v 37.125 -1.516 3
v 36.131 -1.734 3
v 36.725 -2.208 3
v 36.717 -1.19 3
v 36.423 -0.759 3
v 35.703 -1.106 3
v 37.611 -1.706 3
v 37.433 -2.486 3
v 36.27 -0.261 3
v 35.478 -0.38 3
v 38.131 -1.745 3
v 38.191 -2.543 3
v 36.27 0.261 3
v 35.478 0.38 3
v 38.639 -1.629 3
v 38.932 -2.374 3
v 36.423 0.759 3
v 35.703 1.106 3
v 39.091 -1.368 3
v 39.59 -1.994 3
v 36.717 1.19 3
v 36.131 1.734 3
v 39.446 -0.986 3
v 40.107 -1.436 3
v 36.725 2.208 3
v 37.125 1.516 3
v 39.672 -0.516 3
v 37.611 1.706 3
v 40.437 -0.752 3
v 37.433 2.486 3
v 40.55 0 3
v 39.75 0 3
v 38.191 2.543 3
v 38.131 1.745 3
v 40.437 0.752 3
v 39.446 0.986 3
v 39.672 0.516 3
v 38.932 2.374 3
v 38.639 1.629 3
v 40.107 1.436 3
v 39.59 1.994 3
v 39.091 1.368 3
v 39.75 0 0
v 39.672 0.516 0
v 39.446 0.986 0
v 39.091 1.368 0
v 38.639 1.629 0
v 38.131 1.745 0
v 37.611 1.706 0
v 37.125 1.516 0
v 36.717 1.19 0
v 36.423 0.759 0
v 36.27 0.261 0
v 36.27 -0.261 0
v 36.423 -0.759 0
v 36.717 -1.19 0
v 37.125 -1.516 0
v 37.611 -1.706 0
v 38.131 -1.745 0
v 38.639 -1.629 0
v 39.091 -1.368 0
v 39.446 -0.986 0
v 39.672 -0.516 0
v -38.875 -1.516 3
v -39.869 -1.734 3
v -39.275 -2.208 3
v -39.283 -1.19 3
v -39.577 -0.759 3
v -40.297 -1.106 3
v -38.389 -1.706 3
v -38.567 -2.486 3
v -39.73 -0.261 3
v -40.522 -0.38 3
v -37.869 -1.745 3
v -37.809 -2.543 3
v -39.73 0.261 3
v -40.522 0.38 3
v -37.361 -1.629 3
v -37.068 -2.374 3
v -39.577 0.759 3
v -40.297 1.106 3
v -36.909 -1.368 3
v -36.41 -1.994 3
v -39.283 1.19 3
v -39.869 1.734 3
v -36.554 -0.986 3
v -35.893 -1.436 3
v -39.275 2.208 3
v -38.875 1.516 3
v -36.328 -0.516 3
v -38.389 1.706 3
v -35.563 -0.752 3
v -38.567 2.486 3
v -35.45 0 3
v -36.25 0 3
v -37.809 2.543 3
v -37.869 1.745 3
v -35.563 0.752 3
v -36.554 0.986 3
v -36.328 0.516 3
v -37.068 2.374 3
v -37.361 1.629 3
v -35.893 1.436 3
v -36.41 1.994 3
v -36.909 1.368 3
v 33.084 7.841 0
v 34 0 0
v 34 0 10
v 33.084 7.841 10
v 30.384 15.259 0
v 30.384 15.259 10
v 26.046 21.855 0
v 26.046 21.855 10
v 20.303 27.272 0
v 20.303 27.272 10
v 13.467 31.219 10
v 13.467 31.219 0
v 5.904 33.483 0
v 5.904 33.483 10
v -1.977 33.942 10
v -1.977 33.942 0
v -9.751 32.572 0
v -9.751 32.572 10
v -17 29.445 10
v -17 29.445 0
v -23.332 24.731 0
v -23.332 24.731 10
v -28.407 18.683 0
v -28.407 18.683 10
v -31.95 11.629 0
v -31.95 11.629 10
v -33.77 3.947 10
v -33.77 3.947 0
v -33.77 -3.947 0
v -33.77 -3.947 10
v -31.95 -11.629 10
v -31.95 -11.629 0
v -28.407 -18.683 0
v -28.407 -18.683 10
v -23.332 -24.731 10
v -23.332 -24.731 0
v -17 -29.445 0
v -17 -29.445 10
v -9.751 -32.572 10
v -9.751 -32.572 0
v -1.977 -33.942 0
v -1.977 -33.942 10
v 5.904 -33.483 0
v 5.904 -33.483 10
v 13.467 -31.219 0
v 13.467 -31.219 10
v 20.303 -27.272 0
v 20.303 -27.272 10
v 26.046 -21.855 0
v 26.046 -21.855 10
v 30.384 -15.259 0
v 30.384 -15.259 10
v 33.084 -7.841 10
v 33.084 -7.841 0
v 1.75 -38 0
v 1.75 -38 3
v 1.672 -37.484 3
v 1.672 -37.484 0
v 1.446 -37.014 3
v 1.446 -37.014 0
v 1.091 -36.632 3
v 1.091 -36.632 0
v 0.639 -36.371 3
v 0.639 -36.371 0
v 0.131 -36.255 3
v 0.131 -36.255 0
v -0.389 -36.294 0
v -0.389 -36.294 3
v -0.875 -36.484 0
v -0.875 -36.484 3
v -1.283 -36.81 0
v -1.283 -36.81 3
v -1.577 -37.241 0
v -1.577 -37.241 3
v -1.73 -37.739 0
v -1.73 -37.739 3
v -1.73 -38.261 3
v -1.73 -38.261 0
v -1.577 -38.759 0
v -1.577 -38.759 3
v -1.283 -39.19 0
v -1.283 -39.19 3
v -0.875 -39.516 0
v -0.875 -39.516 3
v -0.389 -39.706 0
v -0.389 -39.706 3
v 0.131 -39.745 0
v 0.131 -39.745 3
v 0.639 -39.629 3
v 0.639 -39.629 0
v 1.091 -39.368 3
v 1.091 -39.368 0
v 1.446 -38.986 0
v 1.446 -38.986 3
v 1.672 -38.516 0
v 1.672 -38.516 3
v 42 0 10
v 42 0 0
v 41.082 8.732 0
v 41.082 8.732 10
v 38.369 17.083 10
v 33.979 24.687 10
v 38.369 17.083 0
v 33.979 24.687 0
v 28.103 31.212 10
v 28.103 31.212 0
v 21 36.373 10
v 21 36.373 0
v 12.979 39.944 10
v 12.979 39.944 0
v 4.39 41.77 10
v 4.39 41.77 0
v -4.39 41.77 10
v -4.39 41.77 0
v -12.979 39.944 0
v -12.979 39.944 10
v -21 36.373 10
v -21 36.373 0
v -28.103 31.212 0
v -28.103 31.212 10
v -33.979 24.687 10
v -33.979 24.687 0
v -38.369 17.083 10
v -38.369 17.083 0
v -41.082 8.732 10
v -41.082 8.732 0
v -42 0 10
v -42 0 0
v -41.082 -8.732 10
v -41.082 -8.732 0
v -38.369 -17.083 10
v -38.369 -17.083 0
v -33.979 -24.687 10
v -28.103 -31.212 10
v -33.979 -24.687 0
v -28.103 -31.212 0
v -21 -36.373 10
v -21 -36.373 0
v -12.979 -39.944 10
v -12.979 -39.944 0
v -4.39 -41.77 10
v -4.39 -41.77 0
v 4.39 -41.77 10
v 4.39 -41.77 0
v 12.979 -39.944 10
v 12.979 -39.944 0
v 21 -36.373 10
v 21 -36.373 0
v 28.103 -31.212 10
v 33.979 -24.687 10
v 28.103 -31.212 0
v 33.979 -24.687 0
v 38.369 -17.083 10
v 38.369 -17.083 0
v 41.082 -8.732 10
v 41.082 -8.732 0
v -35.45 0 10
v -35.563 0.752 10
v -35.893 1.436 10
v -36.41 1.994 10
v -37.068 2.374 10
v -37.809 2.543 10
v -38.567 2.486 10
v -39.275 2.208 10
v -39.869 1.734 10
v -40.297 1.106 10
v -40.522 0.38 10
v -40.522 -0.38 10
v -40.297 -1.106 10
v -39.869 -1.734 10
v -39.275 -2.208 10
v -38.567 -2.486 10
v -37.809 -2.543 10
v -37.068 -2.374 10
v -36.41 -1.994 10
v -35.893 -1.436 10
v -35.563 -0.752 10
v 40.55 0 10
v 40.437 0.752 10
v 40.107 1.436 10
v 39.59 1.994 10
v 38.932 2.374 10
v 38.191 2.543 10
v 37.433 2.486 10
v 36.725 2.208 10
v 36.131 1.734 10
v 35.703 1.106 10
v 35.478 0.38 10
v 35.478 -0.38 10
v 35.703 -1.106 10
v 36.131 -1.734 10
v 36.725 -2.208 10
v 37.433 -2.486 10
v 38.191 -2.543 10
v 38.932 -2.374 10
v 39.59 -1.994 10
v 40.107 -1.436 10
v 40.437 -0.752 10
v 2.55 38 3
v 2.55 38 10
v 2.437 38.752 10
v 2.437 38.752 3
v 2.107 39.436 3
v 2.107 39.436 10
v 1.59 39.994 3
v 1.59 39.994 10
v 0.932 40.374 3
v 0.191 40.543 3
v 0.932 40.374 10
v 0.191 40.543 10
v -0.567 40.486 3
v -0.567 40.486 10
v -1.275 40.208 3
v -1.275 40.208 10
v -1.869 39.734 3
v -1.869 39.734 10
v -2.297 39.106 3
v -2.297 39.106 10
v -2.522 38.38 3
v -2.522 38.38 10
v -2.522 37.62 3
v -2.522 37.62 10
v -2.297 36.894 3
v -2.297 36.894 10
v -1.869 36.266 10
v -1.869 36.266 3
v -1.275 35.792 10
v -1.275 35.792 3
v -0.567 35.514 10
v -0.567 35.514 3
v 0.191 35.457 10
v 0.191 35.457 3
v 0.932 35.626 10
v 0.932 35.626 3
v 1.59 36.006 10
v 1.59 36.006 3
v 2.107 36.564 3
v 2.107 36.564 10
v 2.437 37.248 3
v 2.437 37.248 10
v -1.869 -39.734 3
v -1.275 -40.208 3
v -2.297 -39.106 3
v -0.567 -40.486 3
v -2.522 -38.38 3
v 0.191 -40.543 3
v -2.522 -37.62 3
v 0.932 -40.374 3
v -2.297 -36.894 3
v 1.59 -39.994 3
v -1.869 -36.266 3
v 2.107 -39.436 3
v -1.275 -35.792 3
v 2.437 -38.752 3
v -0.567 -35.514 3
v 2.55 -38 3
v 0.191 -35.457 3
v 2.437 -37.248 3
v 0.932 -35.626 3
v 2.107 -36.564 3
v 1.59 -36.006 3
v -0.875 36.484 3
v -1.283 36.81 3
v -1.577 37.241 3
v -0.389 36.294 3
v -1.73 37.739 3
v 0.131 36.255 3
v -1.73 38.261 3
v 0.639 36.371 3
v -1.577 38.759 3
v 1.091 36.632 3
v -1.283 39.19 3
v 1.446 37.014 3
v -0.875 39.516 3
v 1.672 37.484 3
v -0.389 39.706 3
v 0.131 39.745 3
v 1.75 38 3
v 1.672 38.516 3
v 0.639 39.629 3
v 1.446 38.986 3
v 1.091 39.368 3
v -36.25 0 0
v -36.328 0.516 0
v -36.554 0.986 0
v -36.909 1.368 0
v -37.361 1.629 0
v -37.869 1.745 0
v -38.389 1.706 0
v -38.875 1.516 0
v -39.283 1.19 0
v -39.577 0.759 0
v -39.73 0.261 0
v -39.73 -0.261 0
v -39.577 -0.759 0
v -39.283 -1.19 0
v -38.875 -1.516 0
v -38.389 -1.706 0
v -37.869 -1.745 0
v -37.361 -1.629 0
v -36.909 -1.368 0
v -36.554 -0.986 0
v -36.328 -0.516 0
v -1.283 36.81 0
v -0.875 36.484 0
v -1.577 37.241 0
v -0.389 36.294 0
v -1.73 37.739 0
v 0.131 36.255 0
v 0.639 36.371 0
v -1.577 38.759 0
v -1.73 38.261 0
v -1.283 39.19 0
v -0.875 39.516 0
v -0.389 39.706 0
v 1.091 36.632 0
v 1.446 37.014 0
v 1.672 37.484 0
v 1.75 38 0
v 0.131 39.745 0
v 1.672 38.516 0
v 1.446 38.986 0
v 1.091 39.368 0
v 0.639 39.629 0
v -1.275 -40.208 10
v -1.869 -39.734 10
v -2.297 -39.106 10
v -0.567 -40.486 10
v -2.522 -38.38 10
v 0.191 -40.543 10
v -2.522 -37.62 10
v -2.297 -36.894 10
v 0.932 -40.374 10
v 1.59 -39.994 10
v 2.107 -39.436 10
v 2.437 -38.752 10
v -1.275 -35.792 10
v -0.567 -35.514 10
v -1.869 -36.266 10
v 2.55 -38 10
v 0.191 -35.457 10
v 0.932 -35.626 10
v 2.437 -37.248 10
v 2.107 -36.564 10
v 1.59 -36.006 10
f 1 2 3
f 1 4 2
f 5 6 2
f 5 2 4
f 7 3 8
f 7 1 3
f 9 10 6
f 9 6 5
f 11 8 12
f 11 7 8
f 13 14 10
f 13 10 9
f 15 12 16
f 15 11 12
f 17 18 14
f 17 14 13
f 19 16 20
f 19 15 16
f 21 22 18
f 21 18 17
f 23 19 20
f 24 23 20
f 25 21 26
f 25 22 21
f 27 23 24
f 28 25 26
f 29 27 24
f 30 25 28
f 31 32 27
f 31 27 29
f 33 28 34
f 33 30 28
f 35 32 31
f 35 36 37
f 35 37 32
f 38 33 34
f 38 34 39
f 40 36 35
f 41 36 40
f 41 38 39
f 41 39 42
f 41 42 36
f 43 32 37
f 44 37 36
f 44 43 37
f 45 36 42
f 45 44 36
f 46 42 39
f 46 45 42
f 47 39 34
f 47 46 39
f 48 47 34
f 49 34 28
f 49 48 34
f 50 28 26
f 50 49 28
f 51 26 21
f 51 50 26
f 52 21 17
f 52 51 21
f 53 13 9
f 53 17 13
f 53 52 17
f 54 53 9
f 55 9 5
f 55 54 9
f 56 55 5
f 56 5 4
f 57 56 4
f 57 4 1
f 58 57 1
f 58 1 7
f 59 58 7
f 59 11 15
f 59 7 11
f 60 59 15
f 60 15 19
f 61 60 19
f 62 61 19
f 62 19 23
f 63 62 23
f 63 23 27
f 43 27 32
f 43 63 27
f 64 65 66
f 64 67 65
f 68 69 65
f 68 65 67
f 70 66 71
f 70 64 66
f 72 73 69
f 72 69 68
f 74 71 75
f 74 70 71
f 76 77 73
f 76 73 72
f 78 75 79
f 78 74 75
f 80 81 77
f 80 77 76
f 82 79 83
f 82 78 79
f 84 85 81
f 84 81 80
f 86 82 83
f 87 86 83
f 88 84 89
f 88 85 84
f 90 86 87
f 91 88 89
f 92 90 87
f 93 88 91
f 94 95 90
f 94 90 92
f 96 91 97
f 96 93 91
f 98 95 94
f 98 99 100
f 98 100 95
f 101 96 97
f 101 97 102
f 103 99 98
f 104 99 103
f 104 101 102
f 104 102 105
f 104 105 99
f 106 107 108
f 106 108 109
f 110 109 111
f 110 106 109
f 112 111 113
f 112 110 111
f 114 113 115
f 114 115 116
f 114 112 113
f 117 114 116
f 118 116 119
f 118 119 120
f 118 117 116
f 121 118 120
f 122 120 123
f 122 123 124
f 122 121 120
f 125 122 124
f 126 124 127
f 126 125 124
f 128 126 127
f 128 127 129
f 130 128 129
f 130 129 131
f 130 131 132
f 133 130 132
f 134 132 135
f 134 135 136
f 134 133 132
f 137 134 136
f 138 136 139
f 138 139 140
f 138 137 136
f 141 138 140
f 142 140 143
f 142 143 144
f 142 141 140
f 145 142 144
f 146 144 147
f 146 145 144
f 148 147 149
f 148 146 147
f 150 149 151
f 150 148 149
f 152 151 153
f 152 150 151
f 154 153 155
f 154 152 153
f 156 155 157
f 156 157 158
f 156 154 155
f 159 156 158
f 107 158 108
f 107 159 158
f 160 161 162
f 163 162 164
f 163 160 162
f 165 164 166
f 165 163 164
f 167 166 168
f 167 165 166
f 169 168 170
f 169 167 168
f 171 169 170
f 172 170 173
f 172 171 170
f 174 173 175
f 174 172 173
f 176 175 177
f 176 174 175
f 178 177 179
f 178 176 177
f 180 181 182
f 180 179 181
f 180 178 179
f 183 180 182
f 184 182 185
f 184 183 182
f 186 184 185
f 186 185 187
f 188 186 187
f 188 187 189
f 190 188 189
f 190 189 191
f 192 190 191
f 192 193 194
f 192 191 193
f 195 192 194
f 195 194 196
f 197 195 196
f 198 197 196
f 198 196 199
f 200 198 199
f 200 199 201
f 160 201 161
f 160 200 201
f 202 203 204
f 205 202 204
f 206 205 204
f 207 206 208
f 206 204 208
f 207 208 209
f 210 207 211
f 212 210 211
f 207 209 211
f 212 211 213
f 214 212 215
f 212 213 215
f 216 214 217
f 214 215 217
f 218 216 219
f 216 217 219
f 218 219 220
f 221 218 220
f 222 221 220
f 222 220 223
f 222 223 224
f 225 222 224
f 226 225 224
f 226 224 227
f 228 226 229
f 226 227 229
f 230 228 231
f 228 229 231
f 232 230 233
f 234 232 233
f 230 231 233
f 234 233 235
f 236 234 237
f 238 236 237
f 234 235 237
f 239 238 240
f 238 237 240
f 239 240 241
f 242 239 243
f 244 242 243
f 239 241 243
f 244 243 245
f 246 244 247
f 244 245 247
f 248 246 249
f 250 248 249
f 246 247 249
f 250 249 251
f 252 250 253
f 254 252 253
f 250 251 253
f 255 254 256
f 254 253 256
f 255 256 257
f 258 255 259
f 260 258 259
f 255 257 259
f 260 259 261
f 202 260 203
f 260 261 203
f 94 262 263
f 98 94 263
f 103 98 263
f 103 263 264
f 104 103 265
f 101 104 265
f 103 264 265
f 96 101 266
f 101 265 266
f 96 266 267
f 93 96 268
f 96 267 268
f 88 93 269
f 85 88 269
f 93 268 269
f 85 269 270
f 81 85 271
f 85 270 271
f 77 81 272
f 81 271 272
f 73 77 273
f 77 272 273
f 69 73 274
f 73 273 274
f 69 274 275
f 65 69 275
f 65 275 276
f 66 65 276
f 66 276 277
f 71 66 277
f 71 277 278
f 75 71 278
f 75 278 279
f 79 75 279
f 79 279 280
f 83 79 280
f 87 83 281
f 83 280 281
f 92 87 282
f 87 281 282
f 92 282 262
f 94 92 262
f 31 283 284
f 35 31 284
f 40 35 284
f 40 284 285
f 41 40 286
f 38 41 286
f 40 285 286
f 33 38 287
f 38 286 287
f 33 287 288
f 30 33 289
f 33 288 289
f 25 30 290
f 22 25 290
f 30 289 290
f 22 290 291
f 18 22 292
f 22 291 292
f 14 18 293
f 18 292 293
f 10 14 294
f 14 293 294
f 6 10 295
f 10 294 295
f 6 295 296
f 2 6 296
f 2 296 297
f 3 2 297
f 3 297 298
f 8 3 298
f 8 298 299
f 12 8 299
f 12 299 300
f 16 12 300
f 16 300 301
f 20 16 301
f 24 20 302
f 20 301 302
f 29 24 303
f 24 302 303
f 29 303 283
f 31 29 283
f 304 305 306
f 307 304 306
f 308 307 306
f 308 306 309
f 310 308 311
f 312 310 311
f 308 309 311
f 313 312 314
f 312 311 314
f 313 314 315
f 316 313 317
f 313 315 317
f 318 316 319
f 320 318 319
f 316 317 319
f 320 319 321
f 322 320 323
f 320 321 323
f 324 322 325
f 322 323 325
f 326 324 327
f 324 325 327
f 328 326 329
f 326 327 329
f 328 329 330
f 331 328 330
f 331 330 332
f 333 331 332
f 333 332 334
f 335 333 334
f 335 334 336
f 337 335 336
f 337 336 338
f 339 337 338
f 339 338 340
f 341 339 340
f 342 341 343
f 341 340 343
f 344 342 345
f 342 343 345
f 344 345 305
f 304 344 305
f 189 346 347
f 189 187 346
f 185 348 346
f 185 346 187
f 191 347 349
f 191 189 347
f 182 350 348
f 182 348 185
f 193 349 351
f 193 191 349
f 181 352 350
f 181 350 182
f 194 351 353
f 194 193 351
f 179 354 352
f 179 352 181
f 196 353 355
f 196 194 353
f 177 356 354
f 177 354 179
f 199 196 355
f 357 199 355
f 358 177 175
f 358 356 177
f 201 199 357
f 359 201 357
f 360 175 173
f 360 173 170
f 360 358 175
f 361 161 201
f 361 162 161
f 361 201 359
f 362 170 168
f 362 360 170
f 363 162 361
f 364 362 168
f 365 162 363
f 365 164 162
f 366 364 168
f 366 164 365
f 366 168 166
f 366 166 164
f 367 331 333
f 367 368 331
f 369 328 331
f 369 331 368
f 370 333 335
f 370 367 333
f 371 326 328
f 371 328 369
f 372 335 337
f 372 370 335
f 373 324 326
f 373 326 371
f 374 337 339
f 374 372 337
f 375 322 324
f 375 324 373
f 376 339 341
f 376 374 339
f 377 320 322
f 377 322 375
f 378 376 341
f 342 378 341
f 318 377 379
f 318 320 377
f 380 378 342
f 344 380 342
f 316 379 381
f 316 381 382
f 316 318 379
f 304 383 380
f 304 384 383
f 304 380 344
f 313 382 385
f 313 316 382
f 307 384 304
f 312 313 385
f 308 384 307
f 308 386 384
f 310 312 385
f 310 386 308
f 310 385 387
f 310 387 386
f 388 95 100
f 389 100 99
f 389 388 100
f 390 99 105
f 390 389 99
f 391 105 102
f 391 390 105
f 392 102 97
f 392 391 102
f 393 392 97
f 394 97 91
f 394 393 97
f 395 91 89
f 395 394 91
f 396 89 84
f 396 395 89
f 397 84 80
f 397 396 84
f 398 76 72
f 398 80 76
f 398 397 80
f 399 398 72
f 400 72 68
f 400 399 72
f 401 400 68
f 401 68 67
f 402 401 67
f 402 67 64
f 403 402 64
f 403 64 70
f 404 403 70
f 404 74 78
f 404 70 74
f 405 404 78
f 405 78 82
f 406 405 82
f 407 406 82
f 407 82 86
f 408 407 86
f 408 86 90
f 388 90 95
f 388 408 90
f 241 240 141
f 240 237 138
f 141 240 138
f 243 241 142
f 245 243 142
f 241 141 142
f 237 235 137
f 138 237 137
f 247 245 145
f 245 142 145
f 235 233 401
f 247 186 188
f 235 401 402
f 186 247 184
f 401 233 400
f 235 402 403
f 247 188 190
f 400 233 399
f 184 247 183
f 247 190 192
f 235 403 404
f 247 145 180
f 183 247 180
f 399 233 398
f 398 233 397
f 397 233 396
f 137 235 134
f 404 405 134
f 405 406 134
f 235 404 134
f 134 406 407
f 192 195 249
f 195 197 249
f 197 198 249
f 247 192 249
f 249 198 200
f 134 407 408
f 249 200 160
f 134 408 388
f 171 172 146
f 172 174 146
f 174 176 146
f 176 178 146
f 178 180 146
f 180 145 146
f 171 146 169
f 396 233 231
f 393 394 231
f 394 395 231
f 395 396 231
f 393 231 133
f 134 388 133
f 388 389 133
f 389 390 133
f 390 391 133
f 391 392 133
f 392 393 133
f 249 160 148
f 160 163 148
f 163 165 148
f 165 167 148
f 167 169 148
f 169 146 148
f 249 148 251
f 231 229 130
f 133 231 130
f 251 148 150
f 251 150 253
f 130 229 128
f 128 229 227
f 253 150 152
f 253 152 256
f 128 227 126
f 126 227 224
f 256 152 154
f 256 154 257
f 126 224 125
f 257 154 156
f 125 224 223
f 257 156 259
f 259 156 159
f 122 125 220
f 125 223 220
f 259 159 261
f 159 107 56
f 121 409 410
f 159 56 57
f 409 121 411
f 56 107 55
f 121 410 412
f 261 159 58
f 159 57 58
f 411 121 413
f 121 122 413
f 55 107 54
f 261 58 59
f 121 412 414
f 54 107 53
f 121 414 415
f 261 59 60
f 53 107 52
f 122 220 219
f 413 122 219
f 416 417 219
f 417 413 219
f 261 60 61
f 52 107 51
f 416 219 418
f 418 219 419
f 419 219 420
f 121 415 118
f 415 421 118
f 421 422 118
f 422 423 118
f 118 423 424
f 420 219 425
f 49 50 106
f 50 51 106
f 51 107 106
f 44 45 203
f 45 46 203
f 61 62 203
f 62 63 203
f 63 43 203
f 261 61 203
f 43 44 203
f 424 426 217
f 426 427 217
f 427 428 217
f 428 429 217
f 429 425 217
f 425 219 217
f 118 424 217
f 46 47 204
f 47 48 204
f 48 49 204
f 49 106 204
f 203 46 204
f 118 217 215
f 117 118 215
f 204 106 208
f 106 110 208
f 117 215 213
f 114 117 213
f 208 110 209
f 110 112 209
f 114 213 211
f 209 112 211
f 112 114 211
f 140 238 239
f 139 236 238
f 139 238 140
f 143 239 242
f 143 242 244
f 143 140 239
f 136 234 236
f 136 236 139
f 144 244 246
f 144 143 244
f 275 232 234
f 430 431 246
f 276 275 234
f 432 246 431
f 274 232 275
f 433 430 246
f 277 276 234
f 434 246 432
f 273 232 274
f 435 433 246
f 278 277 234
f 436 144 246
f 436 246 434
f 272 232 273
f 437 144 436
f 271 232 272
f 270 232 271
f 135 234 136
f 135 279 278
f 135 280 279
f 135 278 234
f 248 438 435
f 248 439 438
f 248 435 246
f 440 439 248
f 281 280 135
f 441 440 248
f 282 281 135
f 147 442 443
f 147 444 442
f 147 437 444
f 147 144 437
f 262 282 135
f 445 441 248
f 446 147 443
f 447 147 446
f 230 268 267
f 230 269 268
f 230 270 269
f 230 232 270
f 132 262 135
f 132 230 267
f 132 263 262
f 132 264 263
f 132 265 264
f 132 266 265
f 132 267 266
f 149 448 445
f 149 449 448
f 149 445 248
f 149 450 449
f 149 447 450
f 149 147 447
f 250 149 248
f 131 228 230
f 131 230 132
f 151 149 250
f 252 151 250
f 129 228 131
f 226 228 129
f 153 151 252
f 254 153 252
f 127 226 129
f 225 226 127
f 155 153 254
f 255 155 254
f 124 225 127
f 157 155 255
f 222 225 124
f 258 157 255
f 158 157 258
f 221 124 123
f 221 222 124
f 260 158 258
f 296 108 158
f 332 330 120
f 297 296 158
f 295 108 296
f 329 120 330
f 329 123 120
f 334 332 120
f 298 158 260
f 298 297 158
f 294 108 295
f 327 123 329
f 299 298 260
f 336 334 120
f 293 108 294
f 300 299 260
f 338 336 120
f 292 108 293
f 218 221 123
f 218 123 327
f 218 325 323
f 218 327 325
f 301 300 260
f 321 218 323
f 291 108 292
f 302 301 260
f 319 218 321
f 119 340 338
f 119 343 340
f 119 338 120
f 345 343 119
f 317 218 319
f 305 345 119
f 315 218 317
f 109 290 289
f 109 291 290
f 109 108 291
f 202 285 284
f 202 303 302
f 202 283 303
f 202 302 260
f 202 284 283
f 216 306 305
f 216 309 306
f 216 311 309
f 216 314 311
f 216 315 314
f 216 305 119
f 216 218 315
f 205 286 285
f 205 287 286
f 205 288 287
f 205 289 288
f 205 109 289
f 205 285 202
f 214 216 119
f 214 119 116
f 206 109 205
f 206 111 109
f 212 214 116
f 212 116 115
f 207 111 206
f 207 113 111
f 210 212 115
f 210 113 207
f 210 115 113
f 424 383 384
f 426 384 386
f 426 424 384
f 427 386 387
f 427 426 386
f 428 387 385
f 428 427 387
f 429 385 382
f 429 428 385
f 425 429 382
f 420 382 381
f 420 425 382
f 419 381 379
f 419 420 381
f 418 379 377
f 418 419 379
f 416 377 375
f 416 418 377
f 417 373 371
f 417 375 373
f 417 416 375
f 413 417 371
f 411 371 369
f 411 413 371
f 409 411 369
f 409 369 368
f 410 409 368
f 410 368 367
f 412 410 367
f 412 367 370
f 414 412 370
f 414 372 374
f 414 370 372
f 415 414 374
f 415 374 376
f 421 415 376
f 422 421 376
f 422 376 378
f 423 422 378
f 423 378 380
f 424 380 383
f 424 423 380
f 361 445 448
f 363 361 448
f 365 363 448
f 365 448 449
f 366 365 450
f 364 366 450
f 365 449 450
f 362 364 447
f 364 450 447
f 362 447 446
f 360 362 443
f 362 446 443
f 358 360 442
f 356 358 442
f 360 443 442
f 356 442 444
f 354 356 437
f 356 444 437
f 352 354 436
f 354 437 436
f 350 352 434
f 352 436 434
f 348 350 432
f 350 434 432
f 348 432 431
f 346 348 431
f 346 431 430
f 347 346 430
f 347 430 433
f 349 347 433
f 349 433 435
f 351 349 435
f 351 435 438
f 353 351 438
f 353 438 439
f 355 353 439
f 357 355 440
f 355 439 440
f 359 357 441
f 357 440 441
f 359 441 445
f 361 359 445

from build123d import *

# Parameters (mm, degrees)
SKETCH1_R           = 42
SKETCH1_R_2         = 34
SKETCH1_R_3         = 1.75
BOSS_EXTRUDE1_DEPTH = 10
SKETCH2_R           = 2.55
CUT_EXTRUDE1_DEPTH  = 7


with BuildPart() as part:
    # Sketch1 → Boss-Extrude1 (new body)
    with BuildSketch(Plane.XY):
        Circle(SKETCH1_R)
        Circle(SKETCH1_R_2, mode=Mode.SUBTRACT)
        with Locations((0, 38)):
            Circle(SKETCH1_R_3, mode=Mode.SUBTRACT)
        with Locations((38, 0)):
            Circle(SKETCH1_R_3, mode=Mode.SUBTRACT)
        with Locations((0, -38)):
            Circle(SKETCH1_R_3, mode=Mode.SUBTRACT)
        with Locations((-38, 0)):
            Circle(SKETCH1_R_3, mode=Mode.SUBTRACT)
    extrude(amount=BOSS_EXTRUDE1_DEPTH)

    # Sketch2 → Cut-Extrude1 (cut)
    with BuildSketch(Plane.XY.offset(10)):
        with Locations((0, 38)):
            Circle(SKETCH2_R)
        with Locations((38, 0)):
            Circle(SKETCH2_R)
        with Locations((0, -38)):
            Circle(SKETCH2_R)
        with Locations((-38, 0)):
            Circle(SKETCH2_R)
    extrude(amount=-CUT_EXTRUDE1_DEPTH, mode=Mode.SUBTRACT)


solid = part.part
